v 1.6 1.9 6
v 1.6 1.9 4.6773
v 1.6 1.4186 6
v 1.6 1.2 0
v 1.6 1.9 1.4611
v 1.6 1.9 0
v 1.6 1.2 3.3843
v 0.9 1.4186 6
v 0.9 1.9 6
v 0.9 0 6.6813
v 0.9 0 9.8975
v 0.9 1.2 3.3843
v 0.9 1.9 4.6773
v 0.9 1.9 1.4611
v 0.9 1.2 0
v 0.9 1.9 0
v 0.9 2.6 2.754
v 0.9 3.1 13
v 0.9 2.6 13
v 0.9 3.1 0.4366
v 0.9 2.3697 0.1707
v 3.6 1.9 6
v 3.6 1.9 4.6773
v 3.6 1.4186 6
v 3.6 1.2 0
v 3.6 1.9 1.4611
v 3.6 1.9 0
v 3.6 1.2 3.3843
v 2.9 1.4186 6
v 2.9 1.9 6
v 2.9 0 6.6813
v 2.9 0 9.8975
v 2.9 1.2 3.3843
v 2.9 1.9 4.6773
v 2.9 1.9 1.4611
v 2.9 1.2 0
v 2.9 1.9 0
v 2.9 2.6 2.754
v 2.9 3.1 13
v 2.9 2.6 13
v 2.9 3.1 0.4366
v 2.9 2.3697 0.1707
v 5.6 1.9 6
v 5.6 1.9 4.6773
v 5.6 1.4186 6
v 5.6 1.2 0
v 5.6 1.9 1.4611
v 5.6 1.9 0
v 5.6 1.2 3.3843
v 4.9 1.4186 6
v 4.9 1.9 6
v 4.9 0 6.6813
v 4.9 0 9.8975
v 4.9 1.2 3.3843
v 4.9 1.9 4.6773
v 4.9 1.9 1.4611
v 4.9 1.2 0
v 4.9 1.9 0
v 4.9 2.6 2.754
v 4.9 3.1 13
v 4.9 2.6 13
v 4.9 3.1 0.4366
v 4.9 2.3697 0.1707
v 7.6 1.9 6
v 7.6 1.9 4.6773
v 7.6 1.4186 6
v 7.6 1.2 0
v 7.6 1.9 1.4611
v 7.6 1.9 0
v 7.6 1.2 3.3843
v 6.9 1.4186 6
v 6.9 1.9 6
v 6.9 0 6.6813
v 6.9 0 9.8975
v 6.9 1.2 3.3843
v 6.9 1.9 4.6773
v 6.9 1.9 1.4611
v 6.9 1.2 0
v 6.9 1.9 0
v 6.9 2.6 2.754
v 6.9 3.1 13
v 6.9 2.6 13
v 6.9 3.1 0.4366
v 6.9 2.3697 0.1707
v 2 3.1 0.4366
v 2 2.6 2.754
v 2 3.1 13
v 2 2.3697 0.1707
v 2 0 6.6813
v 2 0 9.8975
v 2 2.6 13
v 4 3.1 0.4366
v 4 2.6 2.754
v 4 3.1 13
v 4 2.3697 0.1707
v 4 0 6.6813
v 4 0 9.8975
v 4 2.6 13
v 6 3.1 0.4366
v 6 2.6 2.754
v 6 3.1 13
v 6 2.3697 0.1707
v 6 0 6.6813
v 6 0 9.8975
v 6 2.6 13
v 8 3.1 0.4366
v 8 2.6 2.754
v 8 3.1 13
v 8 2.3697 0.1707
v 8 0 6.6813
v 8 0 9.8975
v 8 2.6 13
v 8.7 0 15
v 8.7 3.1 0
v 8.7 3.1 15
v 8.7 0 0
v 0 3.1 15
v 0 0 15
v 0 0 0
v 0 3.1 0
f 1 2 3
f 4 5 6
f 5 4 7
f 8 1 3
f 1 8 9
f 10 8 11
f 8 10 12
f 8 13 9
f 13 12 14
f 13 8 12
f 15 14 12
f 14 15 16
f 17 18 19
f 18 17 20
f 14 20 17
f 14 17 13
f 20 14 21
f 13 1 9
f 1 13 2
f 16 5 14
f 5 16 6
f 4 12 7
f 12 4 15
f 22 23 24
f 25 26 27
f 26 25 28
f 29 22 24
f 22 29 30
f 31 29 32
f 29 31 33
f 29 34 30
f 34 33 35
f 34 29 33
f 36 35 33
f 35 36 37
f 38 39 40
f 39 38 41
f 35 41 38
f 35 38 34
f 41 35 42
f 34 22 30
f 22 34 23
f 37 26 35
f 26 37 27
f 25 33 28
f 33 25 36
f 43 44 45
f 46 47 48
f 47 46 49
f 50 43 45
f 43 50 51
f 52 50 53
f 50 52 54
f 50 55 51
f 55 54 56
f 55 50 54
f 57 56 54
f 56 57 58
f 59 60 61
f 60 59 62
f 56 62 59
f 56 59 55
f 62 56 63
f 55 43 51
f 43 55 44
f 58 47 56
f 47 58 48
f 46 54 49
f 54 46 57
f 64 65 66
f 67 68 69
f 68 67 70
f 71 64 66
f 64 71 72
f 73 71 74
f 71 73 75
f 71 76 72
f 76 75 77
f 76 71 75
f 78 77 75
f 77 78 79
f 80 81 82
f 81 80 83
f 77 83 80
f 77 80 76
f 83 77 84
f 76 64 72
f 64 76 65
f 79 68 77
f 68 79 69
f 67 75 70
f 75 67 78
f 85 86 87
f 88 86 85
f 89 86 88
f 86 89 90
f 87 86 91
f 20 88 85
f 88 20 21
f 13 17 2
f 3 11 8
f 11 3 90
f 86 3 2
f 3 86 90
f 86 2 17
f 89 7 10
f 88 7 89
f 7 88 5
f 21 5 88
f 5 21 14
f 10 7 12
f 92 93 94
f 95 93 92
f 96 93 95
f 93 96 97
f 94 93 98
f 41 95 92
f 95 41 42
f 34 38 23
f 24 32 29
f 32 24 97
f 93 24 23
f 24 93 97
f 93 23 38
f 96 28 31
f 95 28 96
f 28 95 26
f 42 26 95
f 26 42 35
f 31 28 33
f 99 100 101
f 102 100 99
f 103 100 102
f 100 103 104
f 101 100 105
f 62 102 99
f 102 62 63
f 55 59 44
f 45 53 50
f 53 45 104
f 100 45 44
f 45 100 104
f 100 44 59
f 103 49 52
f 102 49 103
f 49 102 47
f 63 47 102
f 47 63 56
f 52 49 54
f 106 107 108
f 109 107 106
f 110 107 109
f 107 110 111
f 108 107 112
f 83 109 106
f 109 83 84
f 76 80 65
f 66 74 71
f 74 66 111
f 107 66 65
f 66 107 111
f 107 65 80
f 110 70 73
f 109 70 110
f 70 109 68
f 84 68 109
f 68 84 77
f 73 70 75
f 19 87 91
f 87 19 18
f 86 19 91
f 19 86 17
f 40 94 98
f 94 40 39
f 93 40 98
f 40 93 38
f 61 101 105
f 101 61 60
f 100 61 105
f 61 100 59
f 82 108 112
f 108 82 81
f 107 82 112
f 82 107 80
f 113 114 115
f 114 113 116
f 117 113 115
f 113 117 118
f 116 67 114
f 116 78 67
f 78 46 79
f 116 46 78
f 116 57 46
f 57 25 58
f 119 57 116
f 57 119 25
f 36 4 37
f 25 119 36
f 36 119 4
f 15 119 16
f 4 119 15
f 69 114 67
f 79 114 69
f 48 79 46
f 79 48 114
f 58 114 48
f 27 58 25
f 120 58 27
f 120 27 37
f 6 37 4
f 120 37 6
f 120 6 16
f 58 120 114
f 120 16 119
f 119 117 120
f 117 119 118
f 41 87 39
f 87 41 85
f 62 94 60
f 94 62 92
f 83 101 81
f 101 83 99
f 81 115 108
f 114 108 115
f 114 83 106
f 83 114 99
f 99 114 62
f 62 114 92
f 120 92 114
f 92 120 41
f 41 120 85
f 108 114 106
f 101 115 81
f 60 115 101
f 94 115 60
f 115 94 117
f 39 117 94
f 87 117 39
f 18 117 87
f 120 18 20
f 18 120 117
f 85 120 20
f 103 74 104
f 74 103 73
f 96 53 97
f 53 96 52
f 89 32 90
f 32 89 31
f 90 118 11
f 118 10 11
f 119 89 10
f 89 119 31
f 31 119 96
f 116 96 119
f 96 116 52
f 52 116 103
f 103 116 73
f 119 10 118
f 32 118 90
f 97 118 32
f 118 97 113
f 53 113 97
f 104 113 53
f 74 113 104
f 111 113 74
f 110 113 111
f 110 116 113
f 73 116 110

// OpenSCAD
module holes(z, s) {
  translate([0.9, 1.2, -1]) {
    for(i = [0 : 3]) {
      translate([i * 2, 0, 0])
      cube([s, s, z]);
    }
  }
}
difference() {
  cube([8.7, 3.1, 15]);
  holes(7, 0.7);
  translate([0, 0.9, 0.7])
  rotate(v=[1, 0, 0], a = 20)
  holes(12, 1.1);
  translate([0, 1.4, 2])
  holes(12, 1.1);
}
